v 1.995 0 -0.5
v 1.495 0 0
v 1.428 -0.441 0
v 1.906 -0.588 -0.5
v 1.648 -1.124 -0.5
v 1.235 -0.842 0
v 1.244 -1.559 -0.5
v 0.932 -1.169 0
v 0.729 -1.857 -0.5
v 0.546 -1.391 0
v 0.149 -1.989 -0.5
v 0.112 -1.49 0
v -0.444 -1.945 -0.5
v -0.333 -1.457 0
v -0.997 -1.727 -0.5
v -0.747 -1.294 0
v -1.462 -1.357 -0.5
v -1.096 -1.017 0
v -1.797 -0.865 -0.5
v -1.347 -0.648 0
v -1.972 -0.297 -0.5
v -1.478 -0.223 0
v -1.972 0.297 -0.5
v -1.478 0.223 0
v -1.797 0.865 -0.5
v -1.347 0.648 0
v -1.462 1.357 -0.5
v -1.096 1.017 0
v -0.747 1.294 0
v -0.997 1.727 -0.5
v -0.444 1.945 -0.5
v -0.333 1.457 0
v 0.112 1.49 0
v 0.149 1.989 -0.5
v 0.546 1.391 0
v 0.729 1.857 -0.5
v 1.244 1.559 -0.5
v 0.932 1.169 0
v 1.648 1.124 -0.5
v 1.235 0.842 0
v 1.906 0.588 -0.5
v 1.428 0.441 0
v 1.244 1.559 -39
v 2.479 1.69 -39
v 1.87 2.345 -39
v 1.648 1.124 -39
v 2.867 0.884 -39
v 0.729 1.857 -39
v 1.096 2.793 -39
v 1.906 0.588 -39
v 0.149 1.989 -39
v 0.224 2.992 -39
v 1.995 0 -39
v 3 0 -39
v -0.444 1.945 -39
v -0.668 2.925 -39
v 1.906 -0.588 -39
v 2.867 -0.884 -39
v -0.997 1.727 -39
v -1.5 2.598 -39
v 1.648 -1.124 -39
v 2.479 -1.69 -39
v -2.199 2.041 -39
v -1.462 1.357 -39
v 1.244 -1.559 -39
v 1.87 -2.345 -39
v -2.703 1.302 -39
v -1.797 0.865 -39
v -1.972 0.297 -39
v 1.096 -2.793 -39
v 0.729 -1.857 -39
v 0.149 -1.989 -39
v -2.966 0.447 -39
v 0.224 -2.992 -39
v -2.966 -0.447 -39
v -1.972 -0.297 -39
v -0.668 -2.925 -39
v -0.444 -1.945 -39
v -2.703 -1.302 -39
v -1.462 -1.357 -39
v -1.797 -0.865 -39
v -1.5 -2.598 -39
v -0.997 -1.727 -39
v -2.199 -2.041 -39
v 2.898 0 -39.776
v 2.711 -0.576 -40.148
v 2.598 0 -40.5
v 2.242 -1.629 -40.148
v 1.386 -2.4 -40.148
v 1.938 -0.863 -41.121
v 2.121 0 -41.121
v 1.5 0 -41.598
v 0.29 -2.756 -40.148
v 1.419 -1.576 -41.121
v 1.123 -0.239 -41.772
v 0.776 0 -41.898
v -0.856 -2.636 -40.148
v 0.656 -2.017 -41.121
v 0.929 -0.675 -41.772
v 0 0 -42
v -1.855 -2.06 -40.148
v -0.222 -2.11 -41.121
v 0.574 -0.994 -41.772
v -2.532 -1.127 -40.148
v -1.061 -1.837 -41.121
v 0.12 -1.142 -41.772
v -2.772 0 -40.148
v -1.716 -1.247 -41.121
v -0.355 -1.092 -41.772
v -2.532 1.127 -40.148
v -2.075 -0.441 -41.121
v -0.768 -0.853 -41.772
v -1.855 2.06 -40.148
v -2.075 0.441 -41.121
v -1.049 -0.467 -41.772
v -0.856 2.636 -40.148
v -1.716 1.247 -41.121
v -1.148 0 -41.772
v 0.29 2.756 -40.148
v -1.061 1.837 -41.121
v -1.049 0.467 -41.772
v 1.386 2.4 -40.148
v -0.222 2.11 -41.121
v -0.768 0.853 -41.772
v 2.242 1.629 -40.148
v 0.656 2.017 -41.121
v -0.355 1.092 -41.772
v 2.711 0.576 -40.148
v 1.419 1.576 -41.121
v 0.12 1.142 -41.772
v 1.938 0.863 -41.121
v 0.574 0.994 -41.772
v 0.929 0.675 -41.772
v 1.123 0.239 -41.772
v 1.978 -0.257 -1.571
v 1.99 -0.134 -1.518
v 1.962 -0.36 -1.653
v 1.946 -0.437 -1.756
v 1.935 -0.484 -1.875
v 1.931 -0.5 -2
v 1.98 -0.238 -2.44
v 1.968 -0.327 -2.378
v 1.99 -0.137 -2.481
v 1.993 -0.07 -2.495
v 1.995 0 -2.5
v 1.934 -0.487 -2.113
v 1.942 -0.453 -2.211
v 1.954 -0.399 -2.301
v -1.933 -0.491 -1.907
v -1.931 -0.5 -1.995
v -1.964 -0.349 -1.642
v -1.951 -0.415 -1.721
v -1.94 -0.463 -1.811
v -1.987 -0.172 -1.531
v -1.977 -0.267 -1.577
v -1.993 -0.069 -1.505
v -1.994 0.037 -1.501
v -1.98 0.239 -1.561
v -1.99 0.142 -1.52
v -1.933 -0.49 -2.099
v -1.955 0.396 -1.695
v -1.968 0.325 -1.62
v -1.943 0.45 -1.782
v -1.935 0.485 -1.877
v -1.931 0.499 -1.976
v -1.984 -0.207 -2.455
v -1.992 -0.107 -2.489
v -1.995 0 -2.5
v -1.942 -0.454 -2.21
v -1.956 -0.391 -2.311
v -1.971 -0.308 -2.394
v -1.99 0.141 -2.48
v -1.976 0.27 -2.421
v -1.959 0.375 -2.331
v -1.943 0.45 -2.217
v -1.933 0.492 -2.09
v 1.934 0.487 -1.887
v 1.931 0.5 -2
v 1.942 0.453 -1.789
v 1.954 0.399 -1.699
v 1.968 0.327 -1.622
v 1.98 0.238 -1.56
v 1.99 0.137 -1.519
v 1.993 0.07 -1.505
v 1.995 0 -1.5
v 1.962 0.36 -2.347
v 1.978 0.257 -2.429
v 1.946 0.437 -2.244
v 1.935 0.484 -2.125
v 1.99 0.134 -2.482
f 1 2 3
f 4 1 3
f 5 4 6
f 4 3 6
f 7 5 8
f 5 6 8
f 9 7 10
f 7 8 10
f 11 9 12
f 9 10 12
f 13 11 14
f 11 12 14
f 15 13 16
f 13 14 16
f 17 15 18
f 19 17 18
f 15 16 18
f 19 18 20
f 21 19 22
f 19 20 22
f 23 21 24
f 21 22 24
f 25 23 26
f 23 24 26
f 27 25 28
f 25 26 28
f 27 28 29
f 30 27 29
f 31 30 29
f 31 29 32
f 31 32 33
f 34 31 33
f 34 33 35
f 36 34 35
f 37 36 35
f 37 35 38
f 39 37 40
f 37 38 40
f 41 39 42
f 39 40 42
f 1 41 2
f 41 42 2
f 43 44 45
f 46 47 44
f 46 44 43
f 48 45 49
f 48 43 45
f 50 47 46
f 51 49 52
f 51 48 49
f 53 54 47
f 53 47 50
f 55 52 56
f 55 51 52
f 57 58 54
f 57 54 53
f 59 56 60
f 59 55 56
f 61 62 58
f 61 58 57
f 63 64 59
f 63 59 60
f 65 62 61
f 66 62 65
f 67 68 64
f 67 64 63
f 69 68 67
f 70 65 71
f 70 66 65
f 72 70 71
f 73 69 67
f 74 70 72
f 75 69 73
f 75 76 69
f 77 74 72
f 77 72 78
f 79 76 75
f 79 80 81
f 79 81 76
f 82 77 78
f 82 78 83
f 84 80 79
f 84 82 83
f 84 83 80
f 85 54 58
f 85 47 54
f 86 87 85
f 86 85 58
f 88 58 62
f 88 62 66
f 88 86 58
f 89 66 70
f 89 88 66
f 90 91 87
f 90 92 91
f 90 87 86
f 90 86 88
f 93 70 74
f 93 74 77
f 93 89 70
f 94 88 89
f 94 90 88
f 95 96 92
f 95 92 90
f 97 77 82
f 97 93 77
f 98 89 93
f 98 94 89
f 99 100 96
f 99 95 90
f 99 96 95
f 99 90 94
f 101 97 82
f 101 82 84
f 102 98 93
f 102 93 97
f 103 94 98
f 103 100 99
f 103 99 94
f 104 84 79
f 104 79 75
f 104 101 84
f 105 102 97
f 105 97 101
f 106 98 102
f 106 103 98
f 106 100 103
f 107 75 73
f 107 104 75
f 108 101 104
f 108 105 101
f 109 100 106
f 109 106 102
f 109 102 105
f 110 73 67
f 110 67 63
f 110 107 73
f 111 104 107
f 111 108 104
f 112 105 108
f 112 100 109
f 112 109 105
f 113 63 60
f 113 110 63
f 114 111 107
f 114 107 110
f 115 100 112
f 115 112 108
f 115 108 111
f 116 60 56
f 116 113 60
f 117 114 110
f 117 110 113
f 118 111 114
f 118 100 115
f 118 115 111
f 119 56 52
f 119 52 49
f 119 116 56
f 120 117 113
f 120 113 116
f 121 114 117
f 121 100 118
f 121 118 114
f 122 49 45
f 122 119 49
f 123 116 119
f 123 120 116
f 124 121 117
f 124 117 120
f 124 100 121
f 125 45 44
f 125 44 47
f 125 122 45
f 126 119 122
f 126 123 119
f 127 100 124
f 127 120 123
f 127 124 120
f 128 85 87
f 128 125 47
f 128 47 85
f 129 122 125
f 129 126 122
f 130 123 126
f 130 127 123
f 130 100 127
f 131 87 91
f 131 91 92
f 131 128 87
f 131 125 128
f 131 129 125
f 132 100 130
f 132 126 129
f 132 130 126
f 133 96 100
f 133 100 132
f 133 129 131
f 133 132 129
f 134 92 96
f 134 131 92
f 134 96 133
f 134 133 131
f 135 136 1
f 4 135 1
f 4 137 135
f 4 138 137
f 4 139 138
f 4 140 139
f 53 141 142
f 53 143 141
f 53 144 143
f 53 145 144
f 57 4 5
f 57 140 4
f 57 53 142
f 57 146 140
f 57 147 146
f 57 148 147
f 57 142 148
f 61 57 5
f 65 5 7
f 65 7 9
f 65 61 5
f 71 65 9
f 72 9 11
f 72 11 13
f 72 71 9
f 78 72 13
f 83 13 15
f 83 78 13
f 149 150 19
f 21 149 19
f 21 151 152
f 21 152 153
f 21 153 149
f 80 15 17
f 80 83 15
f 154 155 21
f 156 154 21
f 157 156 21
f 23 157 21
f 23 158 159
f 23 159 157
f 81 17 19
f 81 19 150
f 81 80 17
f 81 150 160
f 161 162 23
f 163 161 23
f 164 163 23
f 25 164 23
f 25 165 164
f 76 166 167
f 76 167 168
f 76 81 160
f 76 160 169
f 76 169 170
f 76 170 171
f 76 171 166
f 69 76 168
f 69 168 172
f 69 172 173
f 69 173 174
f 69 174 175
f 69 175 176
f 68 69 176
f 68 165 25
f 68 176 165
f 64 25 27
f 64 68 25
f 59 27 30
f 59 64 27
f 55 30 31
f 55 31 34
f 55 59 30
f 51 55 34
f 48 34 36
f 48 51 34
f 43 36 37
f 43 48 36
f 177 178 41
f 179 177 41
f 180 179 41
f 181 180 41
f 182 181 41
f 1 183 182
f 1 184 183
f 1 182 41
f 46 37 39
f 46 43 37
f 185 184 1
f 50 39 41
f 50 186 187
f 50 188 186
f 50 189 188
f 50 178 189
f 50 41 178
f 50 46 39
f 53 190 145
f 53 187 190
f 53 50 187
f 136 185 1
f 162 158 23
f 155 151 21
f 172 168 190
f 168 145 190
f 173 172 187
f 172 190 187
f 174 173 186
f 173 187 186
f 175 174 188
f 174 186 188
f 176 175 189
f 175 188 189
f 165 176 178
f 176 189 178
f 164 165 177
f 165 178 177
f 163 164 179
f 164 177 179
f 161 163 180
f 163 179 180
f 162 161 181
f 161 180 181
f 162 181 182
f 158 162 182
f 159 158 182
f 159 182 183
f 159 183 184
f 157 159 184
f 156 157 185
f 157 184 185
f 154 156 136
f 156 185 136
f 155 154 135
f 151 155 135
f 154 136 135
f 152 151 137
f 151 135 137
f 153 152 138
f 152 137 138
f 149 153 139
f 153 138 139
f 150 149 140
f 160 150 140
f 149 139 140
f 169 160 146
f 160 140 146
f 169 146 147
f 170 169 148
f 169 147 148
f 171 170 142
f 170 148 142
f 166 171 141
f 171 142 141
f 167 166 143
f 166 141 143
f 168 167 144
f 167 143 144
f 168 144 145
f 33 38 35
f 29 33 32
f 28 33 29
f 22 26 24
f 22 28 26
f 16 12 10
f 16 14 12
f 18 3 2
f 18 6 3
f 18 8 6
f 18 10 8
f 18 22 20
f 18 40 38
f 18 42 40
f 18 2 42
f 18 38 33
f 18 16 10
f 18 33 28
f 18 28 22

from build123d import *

# Parameters (mm, degrees)
SKETCH2_R          = 0.5
CUT_EXTRUDE1_DEPTH = 5
CHAMFER1_SIZE      = 0.5


with BuildPart() as part:
    # Sketch1 → Revolve1 (revolve)
    with BuildSketch(Plane(origin=(0, 0, 0), x_dir=(0, 0, -1), z_dir=(1, 0, 0)), mode=Mode.PRIVATE) as revolve1_sk:
        with BuildLine():
            Line((0, 1.994594595), (39, 1.994594595))
            Line((39, 1.994594595), (39, 3))
            ThreePointArc((39, 3), (41.121320344, 2.121320344), (42, 0))
            Line((42, 0), (0, 0))
            Line((0, 0), (0, 1.994594595))
        make_face()
    revolve(revolve1_sk.sketch.rotate(Axis((0, 0, 0), (0, 0, -1)), 90), axis=Axis((0, 0, 0), (0, 0, -1)))

    # Sketch2 → Cut-Extrude1 (cut, symmetric)
    with BuildSketch(Plane(origin=(0, 0, 0), x_dir=(0, 0, -1), z_dir=(1, 0, 0))):
        with Locations((2, 0)):
            Circle(SKETCH2_R)
    extrude(amount=CUT_EXTRUDE1_DEPTH, both=True, mode=Mode.SUBTRACT)

    # Chamfer1
    chamfer1_edges = [part.edges().sort_by_distance(p)[0] for p in [
        (-1.994594595, 0, 0),
    ]]
    chamfer(chamfer1_edges, length=CHAMFER1_SIZE)


solid = part.part
